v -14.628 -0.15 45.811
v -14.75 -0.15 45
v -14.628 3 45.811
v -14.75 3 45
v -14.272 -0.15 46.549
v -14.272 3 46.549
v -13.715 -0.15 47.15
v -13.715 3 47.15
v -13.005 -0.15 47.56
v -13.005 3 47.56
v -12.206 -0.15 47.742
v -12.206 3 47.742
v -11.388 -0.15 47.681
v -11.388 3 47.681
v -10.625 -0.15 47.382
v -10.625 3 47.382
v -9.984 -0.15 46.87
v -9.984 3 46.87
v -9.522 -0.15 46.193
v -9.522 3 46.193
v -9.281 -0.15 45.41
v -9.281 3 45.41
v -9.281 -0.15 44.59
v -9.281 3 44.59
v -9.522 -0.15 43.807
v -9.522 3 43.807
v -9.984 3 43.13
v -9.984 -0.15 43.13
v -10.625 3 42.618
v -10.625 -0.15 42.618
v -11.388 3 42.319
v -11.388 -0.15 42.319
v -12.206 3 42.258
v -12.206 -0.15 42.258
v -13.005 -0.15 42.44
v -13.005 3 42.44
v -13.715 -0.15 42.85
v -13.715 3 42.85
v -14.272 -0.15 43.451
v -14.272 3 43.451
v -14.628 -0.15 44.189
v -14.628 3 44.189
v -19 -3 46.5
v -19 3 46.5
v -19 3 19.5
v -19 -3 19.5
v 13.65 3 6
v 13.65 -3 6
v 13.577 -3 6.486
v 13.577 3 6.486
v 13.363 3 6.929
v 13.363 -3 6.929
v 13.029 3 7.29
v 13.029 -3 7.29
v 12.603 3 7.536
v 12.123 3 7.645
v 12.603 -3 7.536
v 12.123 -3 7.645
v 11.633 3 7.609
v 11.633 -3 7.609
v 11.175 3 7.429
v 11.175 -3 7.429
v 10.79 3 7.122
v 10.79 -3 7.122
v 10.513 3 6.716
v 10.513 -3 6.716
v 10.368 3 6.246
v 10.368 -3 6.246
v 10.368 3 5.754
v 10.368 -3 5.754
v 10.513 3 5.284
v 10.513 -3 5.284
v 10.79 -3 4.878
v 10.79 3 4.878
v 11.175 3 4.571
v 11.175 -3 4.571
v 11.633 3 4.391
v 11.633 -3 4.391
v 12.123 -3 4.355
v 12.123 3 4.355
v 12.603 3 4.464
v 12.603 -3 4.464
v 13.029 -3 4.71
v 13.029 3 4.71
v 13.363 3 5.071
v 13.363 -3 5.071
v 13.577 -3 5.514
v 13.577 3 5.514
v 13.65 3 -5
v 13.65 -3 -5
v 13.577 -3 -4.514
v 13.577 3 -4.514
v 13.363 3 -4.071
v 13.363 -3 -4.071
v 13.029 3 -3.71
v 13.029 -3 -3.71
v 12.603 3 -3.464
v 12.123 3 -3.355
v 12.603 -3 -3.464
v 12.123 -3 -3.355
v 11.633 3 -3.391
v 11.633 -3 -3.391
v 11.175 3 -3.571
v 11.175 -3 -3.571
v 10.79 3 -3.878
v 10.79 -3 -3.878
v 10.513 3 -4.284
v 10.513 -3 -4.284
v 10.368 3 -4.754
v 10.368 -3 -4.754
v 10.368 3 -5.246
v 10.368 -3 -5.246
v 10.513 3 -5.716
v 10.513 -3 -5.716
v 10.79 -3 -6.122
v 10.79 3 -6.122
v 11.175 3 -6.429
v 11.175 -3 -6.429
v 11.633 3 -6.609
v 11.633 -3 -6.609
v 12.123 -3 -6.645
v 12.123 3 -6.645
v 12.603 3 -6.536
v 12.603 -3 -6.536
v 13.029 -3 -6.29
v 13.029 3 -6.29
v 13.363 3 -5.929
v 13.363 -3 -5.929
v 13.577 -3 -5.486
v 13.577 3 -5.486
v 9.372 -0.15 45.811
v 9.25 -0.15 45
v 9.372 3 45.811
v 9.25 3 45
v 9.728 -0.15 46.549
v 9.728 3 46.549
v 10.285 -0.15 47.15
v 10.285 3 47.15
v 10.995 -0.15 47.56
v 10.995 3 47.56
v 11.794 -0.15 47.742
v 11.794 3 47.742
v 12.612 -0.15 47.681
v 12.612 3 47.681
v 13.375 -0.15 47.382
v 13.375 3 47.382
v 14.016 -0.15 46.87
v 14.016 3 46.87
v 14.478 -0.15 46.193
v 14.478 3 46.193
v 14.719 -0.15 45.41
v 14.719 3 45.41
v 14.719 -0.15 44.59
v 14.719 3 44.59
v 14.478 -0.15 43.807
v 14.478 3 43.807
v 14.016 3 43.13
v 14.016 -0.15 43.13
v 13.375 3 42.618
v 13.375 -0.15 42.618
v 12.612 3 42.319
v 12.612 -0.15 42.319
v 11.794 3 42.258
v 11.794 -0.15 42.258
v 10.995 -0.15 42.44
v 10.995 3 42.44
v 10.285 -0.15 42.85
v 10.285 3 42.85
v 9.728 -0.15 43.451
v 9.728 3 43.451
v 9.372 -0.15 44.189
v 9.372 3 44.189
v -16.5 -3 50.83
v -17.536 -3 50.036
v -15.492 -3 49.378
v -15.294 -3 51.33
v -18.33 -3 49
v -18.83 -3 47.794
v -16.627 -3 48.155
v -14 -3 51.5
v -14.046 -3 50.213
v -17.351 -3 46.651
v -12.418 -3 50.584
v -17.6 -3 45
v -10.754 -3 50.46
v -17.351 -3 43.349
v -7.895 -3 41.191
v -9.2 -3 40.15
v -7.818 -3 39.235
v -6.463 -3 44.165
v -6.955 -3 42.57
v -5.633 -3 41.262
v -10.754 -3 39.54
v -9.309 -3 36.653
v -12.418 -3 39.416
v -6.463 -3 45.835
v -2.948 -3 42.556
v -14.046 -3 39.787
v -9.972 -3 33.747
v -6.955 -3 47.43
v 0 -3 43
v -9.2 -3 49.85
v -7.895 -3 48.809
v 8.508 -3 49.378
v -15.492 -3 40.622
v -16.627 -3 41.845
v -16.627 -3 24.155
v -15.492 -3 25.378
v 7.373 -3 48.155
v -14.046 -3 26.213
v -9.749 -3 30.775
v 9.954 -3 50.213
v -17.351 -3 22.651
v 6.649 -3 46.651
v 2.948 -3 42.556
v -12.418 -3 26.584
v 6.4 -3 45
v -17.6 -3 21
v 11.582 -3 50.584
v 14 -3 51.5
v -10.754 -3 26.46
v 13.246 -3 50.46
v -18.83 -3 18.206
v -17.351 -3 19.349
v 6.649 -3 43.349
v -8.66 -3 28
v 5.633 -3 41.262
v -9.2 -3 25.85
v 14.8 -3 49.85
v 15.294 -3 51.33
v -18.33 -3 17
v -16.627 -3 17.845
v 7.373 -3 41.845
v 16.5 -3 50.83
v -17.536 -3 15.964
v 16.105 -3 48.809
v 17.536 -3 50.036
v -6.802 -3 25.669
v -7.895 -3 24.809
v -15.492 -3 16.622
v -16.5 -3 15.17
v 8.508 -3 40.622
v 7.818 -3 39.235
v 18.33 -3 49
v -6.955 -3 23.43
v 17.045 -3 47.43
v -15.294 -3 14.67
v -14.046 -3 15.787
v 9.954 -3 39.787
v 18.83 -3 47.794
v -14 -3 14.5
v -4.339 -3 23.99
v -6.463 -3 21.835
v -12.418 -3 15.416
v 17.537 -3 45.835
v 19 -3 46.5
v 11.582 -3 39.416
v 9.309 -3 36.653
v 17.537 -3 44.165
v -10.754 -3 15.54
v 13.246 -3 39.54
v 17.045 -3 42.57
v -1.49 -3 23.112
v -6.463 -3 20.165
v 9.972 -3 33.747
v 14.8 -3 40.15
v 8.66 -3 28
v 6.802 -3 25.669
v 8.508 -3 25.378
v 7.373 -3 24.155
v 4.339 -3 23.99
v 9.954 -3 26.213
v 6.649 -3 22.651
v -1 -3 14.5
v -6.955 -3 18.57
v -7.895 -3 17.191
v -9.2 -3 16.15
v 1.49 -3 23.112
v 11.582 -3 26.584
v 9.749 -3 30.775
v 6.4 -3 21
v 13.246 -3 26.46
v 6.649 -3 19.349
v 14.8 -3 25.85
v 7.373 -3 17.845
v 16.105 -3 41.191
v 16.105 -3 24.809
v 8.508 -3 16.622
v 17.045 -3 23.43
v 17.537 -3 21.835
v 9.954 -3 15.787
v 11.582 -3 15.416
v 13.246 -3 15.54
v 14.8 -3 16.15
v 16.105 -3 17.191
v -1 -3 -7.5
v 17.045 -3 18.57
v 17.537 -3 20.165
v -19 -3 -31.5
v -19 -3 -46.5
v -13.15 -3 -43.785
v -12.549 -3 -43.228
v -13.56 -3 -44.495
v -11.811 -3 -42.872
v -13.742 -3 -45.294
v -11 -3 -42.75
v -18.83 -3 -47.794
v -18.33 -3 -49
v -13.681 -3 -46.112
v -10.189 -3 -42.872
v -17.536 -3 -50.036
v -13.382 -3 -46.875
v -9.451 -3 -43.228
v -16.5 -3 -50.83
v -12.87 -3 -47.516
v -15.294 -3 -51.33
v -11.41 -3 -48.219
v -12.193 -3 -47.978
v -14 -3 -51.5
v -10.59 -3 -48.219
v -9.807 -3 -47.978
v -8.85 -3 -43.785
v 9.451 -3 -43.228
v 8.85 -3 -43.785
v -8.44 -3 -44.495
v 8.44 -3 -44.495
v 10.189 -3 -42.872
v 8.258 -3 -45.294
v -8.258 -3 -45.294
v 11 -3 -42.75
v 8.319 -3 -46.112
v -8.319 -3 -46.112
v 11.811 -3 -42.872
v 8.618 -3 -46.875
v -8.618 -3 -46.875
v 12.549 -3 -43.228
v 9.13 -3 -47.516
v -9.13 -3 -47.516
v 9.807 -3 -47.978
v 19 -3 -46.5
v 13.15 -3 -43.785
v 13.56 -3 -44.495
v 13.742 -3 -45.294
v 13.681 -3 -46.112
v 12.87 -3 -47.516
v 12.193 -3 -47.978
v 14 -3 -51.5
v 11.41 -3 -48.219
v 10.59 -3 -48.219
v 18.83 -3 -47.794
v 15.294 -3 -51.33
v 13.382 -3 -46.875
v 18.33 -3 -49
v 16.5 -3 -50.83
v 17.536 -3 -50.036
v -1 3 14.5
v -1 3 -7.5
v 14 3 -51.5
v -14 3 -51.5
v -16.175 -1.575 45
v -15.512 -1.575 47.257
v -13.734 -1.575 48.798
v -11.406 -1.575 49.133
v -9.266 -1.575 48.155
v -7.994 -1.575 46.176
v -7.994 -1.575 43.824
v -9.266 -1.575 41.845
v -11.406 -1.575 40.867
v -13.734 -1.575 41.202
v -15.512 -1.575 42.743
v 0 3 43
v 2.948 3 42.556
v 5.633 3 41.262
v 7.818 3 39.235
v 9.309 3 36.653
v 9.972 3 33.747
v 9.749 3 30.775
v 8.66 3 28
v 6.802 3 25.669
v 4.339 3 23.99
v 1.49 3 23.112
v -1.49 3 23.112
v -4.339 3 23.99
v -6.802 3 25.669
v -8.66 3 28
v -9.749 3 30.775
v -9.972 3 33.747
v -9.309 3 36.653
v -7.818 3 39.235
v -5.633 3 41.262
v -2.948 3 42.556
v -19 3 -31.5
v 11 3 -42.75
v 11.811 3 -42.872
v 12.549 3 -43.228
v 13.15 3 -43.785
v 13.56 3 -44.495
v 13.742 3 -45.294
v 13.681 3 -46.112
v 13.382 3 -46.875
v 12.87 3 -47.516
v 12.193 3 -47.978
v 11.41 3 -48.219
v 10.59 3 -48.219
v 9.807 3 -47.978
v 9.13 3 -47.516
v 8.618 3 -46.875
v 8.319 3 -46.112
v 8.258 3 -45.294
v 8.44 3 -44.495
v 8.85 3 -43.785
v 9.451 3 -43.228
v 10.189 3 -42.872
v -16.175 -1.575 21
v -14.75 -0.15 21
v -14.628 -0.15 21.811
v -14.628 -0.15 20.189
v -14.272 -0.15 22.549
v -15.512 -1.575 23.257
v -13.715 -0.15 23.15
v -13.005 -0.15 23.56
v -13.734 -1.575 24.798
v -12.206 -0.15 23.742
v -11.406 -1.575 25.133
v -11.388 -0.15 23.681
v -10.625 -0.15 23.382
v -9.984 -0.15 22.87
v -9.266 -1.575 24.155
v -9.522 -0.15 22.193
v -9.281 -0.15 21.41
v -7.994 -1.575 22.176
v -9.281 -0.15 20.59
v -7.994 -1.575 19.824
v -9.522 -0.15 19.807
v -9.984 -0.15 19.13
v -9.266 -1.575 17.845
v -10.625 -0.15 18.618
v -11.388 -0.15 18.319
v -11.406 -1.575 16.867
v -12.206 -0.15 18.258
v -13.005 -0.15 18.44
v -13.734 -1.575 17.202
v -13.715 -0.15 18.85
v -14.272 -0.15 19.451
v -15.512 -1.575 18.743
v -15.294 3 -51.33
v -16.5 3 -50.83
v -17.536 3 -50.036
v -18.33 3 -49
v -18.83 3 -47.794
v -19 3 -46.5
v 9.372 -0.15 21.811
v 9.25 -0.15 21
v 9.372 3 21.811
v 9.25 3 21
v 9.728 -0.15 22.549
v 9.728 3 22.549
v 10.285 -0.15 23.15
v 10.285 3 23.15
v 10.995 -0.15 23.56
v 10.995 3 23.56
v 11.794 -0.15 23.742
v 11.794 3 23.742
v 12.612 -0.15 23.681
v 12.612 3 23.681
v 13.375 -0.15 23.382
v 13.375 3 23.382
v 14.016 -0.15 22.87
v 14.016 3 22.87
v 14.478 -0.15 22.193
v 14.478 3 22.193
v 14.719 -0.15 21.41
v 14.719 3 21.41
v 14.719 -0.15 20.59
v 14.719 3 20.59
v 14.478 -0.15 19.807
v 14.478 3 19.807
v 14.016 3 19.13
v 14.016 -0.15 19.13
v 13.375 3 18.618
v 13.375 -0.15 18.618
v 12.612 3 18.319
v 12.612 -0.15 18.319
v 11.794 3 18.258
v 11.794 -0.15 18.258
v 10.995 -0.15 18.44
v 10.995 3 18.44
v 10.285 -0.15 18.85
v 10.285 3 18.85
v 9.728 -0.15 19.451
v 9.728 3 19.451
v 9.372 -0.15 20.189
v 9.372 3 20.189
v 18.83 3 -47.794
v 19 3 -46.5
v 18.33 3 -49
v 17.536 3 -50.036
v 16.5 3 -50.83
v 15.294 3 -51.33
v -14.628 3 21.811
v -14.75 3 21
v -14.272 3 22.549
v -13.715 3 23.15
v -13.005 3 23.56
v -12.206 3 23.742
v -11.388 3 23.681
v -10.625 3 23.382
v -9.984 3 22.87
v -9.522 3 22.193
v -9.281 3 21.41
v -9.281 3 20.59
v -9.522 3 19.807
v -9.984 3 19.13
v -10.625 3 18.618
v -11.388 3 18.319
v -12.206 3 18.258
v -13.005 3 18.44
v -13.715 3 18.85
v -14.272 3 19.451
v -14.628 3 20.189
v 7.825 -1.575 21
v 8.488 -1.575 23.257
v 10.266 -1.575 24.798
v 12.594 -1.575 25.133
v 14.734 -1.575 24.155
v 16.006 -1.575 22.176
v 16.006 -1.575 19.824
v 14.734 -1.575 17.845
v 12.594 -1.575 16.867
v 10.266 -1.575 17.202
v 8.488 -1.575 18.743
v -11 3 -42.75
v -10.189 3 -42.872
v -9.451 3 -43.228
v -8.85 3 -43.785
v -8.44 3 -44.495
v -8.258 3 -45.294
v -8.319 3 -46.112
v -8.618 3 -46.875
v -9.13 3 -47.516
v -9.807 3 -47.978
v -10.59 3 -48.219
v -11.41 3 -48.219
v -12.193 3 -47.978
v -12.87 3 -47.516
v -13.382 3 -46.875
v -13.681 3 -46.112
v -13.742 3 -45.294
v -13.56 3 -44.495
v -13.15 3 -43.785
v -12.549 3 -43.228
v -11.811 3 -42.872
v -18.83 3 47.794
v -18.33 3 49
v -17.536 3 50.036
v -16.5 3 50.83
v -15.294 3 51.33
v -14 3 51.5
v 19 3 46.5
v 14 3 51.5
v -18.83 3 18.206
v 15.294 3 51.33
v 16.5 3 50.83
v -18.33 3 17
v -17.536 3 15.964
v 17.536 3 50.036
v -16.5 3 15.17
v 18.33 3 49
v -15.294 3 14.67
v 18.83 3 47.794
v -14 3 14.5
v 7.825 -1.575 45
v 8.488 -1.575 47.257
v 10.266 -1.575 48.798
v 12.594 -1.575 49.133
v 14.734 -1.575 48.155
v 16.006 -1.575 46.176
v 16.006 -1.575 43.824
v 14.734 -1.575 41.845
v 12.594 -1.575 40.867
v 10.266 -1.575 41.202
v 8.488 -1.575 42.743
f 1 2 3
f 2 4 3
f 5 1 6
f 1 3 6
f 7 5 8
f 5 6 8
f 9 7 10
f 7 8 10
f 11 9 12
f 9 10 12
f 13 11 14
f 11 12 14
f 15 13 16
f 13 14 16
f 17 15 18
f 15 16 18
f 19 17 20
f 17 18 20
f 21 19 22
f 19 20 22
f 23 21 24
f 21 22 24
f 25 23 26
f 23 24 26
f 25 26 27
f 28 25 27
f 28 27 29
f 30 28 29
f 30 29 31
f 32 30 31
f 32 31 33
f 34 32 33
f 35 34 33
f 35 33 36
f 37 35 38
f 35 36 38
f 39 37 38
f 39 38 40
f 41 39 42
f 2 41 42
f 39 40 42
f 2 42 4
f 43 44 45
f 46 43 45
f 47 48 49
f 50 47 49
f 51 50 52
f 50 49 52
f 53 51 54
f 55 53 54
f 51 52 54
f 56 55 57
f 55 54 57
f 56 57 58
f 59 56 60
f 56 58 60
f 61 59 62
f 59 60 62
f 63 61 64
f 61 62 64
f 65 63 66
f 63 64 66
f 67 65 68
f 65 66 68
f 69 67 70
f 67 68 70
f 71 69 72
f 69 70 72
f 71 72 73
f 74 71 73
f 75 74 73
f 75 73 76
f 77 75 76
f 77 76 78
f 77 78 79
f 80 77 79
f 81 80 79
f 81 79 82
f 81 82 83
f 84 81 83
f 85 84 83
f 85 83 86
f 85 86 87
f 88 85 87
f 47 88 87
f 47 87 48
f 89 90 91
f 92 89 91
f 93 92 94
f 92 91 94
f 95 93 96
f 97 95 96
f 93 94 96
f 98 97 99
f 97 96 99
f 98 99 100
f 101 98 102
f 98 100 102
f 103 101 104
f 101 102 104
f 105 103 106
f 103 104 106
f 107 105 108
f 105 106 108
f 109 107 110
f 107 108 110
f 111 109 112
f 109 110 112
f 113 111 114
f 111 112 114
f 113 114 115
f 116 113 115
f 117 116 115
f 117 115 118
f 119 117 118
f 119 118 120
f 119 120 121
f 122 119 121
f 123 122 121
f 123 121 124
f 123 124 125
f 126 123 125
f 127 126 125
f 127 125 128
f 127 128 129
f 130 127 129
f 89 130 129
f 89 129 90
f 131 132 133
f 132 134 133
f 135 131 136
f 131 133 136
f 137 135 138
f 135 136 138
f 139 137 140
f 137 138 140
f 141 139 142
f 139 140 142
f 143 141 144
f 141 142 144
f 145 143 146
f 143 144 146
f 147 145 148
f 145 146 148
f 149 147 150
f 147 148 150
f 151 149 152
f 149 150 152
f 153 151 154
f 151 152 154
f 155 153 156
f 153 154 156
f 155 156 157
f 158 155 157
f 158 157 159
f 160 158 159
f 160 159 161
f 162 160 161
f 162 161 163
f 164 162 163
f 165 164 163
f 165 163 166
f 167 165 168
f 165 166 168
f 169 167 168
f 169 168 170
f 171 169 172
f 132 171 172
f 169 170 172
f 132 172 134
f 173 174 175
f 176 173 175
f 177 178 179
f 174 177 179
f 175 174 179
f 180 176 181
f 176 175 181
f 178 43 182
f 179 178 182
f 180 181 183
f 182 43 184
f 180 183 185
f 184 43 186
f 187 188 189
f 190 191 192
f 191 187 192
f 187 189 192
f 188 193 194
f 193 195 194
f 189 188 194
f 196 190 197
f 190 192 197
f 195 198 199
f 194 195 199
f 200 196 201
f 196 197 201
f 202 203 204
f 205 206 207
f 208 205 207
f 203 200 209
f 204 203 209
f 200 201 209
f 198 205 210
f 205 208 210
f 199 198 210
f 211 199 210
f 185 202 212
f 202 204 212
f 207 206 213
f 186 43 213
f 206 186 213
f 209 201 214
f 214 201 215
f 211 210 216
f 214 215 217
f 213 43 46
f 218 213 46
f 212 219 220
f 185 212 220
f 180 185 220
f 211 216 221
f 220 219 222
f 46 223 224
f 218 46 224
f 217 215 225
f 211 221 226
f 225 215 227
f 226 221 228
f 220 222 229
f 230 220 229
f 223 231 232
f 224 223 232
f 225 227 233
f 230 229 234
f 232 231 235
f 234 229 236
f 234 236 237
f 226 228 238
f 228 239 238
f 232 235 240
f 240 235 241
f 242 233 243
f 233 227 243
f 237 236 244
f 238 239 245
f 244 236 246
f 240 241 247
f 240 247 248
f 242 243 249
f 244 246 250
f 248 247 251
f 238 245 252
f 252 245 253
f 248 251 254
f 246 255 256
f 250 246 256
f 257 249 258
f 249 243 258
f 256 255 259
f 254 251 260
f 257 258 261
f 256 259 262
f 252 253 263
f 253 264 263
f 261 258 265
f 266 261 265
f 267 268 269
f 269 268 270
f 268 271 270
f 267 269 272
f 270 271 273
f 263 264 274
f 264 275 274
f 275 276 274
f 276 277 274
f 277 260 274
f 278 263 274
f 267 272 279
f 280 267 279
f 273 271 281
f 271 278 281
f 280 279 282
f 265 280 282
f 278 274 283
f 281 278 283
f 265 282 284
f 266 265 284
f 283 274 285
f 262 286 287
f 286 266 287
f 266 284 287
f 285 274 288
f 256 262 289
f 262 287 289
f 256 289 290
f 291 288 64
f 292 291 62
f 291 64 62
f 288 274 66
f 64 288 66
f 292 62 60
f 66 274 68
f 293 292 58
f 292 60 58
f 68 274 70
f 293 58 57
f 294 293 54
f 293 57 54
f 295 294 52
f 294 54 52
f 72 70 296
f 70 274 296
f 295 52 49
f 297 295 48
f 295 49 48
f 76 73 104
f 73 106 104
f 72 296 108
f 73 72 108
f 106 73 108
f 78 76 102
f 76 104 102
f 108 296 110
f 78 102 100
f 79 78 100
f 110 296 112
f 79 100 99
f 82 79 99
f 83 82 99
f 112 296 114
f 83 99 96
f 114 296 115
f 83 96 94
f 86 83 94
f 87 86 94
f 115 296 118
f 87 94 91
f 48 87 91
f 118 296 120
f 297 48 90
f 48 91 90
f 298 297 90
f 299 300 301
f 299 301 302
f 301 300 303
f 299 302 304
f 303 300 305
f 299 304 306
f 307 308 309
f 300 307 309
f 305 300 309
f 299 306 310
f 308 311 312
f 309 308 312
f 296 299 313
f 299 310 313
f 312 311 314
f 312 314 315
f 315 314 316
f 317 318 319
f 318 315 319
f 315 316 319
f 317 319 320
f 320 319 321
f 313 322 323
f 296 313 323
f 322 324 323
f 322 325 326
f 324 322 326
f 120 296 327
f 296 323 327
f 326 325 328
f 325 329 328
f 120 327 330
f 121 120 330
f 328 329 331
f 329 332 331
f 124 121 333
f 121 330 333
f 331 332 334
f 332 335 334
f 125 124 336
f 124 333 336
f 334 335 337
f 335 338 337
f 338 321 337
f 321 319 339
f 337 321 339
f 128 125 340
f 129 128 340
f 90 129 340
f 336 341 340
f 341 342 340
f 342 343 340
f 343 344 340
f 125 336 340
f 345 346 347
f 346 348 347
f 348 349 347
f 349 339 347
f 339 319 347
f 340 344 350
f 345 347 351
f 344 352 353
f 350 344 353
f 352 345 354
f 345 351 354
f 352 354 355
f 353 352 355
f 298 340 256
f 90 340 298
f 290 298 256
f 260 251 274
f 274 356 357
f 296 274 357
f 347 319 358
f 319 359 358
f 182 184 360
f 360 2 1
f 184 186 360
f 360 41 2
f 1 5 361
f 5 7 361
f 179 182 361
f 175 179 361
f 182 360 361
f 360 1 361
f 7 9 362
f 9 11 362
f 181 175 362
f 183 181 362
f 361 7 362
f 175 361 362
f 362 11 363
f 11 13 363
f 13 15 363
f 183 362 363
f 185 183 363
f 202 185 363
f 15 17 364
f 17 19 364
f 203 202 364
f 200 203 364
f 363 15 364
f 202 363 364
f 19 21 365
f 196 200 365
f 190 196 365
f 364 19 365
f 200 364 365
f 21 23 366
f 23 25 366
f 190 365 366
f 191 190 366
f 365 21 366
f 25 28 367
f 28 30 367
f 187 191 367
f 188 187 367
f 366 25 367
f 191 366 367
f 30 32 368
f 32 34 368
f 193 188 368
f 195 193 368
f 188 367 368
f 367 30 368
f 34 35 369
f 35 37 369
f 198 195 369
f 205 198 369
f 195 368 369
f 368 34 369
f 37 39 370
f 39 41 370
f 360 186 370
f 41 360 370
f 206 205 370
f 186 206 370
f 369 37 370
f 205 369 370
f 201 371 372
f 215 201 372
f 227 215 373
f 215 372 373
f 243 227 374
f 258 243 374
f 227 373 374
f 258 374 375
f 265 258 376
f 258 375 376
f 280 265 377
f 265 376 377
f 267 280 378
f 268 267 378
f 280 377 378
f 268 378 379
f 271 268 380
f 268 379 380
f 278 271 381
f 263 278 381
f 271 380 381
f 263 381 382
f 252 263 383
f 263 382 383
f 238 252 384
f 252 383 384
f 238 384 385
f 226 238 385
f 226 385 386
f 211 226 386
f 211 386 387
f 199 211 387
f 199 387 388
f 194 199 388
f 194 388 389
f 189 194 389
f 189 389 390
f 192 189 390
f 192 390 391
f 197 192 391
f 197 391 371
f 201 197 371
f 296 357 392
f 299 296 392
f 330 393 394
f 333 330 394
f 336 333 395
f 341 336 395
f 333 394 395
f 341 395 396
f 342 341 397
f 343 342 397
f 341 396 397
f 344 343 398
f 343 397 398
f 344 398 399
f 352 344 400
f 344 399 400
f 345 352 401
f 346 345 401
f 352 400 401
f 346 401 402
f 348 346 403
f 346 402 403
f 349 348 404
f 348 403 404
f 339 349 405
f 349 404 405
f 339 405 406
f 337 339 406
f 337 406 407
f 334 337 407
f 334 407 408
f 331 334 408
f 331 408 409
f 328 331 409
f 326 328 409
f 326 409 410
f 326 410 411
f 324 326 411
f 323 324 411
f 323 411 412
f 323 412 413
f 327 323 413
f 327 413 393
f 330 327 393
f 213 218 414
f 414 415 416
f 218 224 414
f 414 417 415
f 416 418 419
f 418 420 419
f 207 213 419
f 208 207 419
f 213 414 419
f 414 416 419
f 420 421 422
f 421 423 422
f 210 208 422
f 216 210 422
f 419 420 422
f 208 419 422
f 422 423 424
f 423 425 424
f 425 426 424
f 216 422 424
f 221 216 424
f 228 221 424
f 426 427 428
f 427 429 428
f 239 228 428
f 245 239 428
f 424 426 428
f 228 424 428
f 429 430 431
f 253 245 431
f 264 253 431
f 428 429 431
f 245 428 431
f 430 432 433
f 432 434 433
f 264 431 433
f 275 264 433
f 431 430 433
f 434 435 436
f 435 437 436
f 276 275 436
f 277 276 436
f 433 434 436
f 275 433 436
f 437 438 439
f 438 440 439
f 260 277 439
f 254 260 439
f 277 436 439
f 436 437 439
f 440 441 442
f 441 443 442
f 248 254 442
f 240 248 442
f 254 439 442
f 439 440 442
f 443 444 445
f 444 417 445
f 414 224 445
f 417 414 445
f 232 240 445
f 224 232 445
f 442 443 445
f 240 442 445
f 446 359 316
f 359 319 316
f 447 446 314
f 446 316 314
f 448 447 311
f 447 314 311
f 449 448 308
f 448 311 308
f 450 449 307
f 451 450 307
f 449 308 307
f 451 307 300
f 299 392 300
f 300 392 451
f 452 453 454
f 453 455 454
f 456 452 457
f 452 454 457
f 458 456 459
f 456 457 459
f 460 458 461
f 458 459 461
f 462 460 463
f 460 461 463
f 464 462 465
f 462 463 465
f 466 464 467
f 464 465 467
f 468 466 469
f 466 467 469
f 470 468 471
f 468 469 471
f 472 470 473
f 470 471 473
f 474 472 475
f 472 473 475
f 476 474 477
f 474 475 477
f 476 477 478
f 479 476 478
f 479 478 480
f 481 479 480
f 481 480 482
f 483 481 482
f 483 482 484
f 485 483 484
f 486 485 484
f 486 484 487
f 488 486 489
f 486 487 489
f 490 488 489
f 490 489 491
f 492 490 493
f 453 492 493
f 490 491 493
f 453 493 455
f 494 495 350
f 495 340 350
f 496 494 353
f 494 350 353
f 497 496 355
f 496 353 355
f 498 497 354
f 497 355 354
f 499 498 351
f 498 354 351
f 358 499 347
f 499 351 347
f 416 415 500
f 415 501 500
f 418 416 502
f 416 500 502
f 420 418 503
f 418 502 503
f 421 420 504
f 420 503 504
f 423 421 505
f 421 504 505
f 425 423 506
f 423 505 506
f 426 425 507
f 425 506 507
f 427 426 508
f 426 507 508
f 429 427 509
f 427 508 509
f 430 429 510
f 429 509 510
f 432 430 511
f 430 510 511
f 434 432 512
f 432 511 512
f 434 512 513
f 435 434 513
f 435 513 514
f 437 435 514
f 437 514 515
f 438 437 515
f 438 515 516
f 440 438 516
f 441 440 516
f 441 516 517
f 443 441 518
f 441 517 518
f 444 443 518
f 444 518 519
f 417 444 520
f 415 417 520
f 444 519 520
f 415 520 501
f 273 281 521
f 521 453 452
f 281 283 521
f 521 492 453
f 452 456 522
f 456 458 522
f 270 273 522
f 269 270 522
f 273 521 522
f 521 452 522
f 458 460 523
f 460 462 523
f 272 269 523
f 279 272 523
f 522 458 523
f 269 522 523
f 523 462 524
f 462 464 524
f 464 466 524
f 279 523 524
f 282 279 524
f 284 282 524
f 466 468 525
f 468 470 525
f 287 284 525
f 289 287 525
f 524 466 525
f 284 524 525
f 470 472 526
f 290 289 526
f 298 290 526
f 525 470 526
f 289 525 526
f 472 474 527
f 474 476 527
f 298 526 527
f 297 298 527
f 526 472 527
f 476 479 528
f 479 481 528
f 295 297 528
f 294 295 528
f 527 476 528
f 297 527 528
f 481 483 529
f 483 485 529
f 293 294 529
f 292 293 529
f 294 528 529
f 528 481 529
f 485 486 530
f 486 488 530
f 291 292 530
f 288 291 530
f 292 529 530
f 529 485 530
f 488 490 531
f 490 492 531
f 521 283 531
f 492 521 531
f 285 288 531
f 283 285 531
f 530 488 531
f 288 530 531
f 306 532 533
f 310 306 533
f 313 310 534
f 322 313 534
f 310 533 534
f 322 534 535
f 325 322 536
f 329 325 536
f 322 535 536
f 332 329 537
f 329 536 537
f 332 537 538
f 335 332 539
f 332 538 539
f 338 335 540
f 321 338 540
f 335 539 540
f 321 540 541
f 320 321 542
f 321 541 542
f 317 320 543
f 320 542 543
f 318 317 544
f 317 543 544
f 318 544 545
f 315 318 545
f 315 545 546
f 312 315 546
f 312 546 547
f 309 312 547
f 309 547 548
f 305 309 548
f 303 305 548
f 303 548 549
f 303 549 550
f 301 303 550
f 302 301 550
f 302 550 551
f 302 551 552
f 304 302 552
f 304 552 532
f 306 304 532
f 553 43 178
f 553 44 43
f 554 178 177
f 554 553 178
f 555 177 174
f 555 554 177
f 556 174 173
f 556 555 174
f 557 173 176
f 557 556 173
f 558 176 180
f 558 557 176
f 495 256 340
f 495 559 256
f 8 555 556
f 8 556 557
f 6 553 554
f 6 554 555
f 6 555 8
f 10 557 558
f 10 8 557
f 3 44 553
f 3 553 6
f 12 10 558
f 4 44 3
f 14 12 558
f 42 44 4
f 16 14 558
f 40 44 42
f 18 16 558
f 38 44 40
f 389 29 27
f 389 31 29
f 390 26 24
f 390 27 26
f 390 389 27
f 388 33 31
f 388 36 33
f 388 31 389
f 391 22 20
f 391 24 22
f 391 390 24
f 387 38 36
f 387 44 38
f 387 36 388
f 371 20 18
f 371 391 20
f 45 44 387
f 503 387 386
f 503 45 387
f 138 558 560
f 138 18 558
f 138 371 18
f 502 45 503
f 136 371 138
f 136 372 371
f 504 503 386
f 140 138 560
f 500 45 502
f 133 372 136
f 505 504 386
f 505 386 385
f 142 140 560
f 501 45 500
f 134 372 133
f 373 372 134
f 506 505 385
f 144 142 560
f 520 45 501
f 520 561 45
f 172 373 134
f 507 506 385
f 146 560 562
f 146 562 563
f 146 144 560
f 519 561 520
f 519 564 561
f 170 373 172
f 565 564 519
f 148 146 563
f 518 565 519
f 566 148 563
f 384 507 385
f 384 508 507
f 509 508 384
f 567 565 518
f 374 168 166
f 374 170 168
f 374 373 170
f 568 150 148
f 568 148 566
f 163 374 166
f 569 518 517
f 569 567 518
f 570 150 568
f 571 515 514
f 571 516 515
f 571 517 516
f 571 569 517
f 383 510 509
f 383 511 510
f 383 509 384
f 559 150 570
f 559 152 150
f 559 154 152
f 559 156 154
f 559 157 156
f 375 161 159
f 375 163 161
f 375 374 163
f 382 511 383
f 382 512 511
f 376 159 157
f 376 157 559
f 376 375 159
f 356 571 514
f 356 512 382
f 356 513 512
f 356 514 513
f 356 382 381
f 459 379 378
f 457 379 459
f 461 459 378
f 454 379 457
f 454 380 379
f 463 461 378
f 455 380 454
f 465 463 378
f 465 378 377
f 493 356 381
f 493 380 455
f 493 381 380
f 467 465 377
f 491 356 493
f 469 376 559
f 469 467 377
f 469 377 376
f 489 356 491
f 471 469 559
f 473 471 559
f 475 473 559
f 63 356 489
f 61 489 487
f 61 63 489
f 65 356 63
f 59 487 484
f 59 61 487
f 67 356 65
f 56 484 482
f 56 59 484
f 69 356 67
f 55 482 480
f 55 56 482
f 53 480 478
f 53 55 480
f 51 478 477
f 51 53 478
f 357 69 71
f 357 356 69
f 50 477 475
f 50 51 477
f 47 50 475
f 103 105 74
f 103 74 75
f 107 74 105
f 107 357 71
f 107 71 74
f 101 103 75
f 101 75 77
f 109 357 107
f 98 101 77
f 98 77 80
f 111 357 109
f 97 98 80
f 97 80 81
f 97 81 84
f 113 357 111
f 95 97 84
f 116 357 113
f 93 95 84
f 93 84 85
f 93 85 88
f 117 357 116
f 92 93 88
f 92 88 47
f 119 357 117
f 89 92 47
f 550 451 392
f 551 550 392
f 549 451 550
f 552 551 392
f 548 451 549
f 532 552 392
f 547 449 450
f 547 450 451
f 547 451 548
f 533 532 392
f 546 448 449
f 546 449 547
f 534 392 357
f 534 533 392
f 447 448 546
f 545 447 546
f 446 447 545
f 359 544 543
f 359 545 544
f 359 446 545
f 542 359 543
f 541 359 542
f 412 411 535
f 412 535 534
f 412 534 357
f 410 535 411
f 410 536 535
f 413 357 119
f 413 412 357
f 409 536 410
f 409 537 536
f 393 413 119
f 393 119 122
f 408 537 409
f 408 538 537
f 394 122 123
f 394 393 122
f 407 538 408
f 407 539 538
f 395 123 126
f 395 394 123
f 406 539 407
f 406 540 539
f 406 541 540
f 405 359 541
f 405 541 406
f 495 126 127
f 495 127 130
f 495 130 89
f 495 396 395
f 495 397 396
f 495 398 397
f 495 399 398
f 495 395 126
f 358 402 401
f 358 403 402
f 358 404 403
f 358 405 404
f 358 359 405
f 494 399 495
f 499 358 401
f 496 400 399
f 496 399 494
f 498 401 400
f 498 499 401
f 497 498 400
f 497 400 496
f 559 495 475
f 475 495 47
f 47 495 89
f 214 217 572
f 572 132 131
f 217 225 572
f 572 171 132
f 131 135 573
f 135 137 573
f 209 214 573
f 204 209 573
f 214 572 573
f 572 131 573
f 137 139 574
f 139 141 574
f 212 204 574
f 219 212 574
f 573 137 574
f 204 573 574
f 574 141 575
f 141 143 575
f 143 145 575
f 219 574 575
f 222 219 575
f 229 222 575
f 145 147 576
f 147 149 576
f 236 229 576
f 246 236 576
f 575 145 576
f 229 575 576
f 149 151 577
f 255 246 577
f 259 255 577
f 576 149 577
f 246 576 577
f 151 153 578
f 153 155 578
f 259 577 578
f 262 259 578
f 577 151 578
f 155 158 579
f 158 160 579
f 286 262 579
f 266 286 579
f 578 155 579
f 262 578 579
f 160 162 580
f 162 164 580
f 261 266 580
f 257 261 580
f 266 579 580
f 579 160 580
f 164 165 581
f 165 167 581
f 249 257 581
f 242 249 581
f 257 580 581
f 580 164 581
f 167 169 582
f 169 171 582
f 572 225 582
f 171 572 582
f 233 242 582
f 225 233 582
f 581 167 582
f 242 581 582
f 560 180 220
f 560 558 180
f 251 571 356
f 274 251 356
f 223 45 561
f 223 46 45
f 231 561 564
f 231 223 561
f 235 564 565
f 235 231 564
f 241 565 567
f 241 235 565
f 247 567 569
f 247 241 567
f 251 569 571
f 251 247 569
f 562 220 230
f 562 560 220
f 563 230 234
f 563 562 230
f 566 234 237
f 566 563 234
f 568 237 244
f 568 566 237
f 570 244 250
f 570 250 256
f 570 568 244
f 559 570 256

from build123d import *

# Parameters (mm, degrees)
SKETCH_1_W                   = 38
SKETCH_1_H                   = 103
EXTRUDE_1_DEPTH              = 3
CUT_EXTRUDE_1_DEPTH          = 56.220014488
SKETCH_3_R                   = 10
CUT_EXTRUDE_2_DEPTH          = 56.220014488
HOLE_WIZARD_M5_1_D           = 5.5
HOLE_WIZARD_M5_1_CSINK_D     = 11.2
HOLE_WIZARD_M5_1_CSINK_ANGLE = 90
M4X0_7_1_D                   = 3.3
M4X0_7_1_DEPTH               = 10.1
M4X0_7_1_TIP                 = 0.991420021
SKETCH_8_R                   = 2.75
CUT_EXTRUDE_3_DEPTH          = 56.220014488
FILLET_1_R                   = 5


with BuildPart() as part:
    # 草图1 → 凸台-拉伸1 (new, symmetric)
    with BuildSketch(Plane(origin=(0, 0, 0), x_dir=(1, 0, 0), z_dir=(0, 1, 0))):
        Rectangle(SKETCH_1_W, SKETCH_1_H)
    extrude(amount=EXTRUDE_1_DEPTH, both=True)

    # 草图2 → 切除-拉伸1 (cut, through all)
    with BuildSketch(Plane(origin=(0, 3, 0), x_dir=(1, 0, 0), z_dir=(0, 1, 0))):
        Polygon((-19, -14.5), (-1, -14.5), (-1, 7.5), (-19, 31.5), align=None)
    extrude(amount=-CUT_EXTRUDE_1_DEPTH, mode=Mode.SUBTRACT)

    # 草图3 → 切除-拉伸2 (cut, through all)
    with BuildSketch(Plane(origin=(0, 3, 0), x_dir=(1, 0, 0), z_dir=(0, 1, 0))):
        with Locations(Location((0, -33, 0), (0, 0, 270))):
            Circle(SKETCH_3_R)
    extrude(amount=-CUT_EXTRUDE_2_DEPTH, mode=Mode.SUBTRACT)

    # M5 六角凹锥坑螺钉的锥形沉头孔1 (through all)
    with Locations(Plane.XZ.offset(3)):
        with Locations((12, 45), (-12, 45), (-12, 21), (12, 21)):
            CounterSinkHole(HOLE_WIZARD_M5_1_D / 2, HOLE_WIZARD_M5_1_CSINK_D / 2, counter_sink_angle=HOLE_WIZARD_M5_1_CSINK_ANGLE)

    # M4x0.7 螺纹孔1
    with Locations(Plane(origin=(0, 3, 0), x_dir=(-1, 0, 0), z_dir=(0, 1, 0))):
        with Locations((-12, -5), (-12, 6)):
            Hole(M4X0_7_1_D / 2, depth=M4X0_7_1_DEPTH)
            with Locations((0, 0, -(M4X0_7_1_DEPTH + M4X0_7_1_TIP / 2))):  # 118° drill point
                Cone(0, M4X0_7_1_D / 2, M4X0_7_1_TIP, mode=Mode.SUBTRACT)

    # 草图8 → 切除-拉伸3 (cut, through all)
    with BuildSketch(Plane(origin=(0, 3, 0), x_dir=(1, 0, 0), z_dir=(0, 1, 0))):
        with Locations(Location((-11, 45.5, 0), (0, 0, 270))):
            Circle(SKETCH_8_R)
        with Locations(Location((11, 45.5, 0), (0, 0, 270))):
            Circle(SKETCH_8_R)
    extrude(amount=-CUT_EXTRUDE_3_DEPTH, mode=Mode.SUBTRACT)

    # 圆角1
    fillet_1_edges = [part.edges().sort_by_distance(p)[0] for p in [
        (-19, 0, 14.5),
        (-19, 0, -51.5),
        (19, 0, -51.5),
        (19, 0, 51.5),
        (-19, 0, 51.5),
    ]]
    fillet(fillet_1_edges, radius=FILLET_1_R)


solid = part.part
